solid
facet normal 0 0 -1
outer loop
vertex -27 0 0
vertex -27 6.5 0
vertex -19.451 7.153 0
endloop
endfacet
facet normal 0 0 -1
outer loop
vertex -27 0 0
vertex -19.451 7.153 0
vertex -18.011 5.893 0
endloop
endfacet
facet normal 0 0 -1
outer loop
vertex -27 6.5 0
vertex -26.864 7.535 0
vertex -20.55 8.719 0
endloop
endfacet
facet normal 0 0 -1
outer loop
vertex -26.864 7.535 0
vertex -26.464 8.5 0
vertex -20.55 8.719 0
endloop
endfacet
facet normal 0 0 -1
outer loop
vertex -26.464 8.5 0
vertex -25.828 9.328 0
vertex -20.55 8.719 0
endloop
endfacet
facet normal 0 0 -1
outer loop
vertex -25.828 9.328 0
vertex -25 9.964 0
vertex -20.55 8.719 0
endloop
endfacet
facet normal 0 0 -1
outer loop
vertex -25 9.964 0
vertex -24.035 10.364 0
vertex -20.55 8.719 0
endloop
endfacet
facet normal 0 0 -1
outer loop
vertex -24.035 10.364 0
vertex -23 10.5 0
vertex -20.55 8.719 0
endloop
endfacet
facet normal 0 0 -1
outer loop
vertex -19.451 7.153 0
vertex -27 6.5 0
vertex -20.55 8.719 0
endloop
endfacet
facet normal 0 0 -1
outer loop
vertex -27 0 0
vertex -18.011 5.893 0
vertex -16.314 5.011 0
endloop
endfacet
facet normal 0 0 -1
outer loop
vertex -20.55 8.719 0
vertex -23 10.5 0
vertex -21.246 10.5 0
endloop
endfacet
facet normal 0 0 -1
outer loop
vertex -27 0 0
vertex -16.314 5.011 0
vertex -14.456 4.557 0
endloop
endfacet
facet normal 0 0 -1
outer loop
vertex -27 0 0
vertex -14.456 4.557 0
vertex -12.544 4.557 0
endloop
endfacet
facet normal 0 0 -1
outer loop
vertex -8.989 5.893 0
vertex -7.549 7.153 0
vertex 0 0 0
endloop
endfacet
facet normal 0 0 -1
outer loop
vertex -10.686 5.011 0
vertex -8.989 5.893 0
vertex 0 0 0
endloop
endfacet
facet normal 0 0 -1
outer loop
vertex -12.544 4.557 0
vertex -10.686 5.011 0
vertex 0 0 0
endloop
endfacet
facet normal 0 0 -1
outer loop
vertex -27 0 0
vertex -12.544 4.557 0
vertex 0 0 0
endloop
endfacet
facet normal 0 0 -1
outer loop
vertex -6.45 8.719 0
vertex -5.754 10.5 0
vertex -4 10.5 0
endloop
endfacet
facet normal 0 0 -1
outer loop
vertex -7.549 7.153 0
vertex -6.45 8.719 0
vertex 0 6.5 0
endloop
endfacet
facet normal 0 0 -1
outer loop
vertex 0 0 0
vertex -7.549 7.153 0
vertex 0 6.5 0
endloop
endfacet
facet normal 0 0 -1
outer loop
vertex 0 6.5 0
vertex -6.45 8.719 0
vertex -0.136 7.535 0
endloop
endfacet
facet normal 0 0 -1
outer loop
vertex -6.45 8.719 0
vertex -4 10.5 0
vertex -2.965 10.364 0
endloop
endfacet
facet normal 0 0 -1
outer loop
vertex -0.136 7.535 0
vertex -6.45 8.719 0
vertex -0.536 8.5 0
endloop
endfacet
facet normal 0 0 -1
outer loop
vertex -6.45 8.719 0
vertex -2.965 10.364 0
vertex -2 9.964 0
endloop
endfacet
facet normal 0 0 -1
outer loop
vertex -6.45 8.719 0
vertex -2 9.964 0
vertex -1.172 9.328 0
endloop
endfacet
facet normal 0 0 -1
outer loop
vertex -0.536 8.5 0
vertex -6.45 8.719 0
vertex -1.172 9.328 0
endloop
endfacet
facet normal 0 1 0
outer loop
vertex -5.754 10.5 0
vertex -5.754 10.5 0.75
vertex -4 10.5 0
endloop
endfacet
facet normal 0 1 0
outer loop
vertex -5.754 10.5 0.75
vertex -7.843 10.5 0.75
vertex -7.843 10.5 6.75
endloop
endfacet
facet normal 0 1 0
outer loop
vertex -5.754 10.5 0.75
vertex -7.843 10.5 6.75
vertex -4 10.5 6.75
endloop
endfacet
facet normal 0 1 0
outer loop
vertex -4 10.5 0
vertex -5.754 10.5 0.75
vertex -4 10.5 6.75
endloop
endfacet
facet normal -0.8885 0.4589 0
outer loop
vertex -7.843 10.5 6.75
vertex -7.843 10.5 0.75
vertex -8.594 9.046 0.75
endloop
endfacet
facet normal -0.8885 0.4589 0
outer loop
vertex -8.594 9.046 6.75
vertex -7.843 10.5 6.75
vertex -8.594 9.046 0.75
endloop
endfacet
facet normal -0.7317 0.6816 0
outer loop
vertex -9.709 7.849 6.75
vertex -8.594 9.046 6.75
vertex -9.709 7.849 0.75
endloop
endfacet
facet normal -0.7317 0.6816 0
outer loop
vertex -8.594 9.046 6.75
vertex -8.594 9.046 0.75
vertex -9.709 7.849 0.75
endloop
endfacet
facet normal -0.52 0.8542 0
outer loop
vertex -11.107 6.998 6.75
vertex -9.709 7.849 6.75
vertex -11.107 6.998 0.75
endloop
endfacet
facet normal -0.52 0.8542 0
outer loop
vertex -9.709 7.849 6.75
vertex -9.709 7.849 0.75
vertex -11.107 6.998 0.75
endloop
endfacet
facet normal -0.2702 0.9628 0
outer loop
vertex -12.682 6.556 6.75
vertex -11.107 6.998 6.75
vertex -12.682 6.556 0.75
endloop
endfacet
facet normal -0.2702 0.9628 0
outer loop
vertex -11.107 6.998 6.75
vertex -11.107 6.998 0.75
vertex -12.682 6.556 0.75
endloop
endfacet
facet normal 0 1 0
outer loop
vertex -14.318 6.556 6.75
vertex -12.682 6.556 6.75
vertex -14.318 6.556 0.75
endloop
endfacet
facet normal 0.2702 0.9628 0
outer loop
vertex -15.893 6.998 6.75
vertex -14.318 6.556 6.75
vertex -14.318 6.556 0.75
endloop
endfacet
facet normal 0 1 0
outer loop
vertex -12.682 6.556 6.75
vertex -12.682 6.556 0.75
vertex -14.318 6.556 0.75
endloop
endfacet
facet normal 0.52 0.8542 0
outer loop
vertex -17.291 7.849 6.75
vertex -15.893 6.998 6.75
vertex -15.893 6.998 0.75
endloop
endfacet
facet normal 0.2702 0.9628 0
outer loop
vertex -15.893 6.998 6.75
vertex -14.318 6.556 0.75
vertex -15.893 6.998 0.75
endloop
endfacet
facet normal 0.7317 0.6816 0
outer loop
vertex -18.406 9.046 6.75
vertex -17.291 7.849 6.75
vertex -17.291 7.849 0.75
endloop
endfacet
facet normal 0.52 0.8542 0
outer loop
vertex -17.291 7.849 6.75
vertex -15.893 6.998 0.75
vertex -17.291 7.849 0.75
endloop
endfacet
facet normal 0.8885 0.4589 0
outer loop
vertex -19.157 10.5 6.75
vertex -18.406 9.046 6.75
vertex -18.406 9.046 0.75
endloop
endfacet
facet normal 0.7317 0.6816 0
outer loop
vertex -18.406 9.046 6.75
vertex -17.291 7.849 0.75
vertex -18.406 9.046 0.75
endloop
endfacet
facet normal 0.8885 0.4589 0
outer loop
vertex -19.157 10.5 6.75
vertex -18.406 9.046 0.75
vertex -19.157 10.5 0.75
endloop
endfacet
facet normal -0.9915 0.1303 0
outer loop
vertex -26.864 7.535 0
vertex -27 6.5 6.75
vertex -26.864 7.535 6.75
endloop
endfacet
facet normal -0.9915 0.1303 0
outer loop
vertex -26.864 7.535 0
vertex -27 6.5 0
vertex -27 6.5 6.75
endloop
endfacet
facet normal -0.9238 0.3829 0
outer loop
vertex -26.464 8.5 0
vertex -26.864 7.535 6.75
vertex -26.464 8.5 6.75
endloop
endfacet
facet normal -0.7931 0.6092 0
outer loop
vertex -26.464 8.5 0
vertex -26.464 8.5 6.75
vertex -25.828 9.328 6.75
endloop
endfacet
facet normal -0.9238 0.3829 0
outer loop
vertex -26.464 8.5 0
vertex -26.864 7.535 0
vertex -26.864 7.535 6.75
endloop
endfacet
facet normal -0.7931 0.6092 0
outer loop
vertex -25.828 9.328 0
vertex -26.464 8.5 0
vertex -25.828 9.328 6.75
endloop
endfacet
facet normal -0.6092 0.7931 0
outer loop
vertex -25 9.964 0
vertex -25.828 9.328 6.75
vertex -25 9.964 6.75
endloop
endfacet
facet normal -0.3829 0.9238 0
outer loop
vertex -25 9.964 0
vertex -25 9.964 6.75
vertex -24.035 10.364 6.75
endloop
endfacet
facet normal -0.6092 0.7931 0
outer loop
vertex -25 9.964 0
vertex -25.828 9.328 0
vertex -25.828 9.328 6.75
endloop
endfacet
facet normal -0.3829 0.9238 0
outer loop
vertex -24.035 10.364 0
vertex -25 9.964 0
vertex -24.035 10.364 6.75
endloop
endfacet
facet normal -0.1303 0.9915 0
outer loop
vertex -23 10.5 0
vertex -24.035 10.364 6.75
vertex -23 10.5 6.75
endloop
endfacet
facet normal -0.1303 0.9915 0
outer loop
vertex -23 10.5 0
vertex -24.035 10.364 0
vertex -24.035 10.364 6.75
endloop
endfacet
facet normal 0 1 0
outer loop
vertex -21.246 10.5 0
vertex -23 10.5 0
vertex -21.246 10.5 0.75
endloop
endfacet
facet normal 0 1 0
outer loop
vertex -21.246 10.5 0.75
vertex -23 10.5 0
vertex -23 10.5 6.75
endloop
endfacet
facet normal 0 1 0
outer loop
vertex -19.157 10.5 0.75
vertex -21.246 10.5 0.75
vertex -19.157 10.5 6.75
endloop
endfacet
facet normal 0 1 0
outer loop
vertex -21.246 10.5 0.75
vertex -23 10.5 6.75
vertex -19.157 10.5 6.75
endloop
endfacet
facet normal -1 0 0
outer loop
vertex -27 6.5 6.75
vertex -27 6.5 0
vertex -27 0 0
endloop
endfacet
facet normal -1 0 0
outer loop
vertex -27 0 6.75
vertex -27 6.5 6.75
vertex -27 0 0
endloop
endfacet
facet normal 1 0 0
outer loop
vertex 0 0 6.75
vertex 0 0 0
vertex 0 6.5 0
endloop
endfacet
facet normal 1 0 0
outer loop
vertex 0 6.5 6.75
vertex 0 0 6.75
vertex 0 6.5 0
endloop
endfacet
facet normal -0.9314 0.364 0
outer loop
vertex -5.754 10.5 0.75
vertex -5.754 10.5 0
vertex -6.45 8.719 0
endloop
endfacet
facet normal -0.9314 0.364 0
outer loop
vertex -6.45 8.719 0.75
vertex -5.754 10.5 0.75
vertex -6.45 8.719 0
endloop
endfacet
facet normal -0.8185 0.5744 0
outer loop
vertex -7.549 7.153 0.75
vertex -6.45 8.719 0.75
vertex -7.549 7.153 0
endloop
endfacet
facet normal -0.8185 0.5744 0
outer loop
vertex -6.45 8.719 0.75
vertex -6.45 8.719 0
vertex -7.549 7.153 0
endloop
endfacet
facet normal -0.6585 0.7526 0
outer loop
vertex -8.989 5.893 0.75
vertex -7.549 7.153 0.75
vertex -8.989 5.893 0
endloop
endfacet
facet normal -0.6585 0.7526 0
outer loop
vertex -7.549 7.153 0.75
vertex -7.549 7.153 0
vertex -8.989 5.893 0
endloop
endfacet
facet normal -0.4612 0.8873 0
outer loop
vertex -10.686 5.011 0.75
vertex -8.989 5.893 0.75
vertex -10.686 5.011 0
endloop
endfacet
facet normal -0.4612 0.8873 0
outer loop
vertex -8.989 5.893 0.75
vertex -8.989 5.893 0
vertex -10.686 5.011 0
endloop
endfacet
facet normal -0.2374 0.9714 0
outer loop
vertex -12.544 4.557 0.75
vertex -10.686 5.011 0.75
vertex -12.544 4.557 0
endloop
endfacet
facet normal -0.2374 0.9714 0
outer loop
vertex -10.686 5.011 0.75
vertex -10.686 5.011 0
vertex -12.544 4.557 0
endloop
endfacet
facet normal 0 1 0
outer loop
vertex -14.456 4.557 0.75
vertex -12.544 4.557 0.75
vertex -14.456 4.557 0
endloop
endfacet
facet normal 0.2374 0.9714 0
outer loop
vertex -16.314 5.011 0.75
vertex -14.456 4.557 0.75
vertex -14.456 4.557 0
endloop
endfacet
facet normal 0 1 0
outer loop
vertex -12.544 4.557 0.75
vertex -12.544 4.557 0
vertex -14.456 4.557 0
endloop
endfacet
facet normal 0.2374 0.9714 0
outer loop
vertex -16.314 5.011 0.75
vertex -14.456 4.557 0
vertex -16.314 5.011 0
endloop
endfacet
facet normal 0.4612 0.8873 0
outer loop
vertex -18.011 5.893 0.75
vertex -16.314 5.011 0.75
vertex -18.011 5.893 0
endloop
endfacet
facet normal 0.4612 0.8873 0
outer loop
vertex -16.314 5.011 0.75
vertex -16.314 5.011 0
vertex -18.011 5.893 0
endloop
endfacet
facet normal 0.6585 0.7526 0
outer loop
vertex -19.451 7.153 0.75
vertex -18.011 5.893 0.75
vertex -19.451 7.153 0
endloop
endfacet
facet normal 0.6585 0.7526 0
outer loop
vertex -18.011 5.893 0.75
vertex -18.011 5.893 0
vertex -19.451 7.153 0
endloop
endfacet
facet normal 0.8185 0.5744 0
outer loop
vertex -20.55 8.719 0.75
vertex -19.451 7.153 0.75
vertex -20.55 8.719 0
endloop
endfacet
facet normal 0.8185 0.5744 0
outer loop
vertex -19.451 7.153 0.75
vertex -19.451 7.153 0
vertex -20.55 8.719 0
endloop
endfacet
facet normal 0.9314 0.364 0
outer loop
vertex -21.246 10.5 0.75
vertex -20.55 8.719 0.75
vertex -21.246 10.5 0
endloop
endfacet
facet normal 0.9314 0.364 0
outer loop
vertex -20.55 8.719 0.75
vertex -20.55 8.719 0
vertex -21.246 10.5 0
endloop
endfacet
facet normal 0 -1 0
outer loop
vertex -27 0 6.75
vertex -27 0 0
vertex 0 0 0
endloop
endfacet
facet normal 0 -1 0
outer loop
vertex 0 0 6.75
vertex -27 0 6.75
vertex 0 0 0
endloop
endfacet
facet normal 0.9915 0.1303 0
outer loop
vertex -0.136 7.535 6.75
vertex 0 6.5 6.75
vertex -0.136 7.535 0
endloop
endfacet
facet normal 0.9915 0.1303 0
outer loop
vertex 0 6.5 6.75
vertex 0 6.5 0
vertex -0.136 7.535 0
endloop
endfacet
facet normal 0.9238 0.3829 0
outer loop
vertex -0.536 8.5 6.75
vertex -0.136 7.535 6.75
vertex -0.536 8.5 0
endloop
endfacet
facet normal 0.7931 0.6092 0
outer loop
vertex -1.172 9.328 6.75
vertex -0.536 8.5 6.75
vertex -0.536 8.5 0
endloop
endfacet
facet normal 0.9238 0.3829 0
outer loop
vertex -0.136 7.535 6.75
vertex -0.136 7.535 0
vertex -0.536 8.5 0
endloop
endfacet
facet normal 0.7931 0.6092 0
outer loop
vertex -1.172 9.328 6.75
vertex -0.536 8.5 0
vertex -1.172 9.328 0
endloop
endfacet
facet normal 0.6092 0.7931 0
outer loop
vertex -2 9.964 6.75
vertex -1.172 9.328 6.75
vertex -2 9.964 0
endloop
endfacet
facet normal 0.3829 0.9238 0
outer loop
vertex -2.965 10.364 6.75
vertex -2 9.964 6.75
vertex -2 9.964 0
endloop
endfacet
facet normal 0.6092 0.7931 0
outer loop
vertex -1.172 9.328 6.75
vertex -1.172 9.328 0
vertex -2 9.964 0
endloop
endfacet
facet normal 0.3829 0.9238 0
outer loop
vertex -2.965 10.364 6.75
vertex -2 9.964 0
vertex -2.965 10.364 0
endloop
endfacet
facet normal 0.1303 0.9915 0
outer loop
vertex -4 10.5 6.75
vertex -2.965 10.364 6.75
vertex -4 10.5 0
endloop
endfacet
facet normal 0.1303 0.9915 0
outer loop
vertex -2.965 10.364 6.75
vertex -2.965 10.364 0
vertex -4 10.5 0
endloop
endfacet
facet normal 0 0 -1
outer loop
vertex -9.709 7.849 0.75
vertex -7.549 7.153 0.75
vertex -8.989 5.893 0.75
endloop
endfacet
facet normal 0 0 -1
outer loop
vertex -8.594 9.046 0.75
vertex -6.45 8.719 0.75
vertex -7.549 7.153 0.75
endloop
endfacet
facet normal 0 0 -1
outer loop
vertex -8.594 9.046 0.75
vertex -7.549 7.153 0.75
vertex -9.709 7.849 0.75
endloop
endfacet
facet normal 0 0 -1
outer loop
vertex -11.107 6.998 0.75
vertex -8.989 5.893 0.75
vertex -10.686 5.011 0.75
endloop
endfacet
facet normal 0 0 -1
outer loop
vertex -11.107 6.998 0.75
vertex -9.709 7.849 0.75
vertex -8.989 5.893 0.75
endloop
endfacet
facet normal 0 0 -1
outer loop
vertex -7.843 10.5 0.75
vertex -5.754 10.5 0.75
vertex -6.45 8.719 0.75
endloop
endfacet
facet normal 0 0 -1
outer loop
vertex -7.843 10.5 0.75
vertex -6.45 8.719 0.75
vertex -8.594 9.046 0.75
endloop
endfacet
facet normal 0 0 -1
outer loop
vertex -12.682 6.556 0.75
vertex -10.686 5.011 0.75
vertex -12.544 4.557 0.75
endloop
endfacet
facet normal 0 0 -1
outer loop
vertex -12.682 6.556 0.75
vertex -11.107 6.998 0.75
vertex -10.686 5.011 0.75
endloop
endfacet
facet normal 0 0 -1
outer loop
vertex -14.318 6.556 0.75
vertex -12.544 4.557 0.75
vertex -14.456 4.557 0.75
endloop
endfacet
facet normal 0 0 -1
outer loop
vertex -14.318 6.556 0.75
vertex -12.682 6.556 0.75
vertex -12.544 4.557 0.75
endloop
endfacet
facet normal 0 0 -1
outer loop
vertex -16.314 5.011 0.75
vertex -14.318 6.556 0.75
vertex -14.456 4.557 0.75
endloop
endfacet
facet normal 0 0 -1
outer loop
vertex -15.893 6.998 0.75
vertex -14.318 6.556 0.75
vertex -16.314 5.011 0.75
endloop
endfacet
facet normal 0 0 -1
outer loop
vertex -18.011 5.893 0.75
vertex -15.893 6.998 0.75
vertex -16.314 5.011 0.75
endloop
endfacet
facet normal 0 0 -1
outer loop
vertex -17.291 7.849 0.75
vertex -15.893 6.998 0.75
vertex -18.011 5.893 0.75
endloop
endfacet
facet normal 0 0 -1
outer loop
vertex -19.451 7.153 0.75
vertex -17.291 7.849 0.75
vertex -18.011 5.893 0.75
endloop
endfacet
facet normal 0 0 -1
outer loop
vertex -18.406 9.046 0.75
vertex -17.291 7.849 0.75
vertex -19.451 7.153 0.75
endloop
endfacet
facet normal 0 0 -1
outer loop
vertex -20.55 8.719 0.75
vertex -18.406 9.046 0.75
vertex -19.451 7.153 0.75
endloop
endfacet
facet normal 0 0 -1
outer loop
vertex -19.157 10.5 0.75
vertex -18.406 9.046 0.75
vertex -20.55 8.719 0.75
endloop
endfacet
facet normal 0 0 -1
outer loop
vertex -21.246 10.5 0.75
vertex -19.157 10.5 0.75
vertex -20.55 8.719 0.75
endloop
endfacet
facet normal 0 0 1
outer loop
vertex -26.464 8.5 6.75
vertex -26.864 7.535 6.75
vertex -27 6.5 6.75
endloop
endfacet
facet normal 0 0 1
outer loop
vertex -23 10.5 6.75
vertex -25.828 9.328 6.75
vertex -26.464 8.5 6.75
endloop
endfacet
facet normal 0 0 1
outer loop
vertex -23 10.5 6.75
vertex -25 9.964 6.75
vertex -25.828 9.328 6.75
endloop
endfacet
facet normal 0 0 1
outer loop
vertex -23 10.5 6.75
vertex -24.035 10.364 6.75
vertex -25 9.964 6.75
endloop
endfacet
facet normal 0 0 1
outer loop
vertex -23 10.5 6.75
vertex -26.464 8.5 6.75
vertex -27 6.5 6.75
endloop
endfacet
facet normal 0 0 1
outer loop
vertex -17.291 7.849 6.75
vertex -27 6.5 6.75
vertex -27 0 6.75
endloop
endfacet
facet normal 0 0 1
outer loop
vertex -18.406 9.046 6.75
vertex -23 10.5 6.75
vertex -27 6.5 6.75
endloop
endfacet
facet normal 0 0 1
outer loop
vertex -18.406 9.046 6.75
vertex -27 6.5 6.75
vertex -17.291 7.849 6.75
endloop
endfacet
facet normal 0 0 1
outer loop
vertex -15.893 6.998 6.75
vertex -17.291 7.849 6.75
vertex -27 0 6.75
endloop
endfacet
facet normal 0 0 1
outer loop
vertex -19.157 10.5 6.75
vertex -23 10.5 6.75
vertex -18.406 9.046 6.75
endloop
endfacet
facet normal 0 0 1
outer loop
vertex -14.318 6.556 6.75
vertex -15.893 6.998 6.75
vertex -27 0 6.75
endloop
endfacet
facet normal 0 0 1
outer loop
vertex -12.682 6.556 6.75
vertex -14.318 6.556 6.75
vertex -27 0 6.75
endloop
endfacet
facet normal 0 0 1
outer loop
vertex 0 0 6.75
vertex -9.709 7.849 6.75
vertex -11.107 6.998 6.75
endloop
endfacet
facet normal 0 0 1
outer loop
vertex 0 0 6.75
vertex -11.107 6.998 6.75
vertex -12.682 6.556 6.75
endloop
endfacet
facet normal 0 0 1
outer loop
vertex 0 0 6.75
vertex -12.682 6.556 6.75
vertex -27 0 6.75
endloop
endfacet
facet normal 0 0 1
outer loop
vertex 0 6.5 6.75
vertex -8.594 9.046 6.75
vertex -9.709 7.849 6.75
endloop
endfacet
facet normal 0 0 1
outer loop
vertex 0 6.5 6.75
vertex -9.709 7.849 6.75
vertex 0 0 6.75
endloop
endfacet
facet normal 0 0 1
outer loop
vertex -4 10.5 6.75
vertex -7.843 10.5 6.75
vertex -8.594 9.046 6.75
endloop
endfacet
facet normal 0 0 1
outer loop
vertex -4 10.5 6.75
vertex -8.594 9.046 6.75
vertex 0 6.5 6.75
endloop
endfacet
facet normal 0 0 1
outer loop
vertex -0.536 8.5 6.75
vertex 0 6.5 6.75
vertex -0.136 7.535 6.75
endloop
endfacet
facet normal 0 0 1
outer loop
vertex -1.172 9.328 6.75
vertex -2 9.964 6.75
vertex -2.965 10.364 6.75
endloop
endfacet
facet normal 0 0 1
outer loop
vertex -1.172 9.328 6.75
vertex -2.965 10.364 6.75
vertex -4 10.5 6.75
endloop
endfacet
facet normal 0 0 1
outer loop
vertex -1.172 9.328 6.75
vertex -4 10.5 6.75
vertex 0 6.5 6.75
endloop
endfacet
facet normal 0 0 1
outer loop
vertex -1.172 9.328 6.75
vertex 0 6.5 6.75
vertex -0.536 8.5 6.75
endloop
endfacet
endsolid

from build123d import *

# Parameters (mm, degrees)
BOSS_EXTRUDE1_DEPTH = 6.75
SKETCH3_R           = 8
CUT_EXTRUDE2_DEPTH  = 0.75
SKETCH4_W           = 27
SKETCH4_H           = 2
CUT_EXTRUDE3_DEPTH  = 9
FILLET1_R           = 4


with BuildPart() as part:
    # Sketch1 → Boss-Extrude1 (new body)
    with BuildSketch(Plane.XY):
        with BuildLine():
            Line((-27, 0), (0, 0))
            Line((0, 0), (0, 12.5))
            Line((0, 12.5), (-7.5, 12.5))
            ThreePointArc((-7.5, 12.5), (-13.5, 6.5), (-19.5, 12.5))
            Line((-19.5, 12.5), (-27, 12.5))
            Line((-27, 12.5), (-27, 0))
        make_face()
    extrude(amount=BOSS_EXTRUDE1_DEPTH)

    # Sketch3 → Cut-Extrude2 (cut)
    with BuildSketch(Plane(origin=(0, 0, 0), x_dir=(-1, 0, 0), z_dir=(0, 0, -1))):
        with Locations((13.5, 12.5)):
            Circle(SKETCH3_R)
    extrude(amount=-CUT_EXTRUDE2_DEPTH, mode=Mode.SUBTRACT)

    # Sketch4 → Cut-Extrude3 (cut)
    with BuildSketch(Plane.XY.offset(6.75)):
        with Locations((-13.5, 11.5)):
            Rectangle(SKETCH4_W, SKETCH4_H)
    extrude(amount=-CUT_EXTRUDE3_DEPTH, mode=Mode.SUBTRACT)

    # Fillet1
    fillet1_edges = [part.edges().sort_by_distance(p)[0] for p in [
        (-27, 10.5, 3.375),
        (0, 10.5, 3.375),
    ]]
    fillet(fillet1_edges, radius=FILLET1_R)


solid = part.part
